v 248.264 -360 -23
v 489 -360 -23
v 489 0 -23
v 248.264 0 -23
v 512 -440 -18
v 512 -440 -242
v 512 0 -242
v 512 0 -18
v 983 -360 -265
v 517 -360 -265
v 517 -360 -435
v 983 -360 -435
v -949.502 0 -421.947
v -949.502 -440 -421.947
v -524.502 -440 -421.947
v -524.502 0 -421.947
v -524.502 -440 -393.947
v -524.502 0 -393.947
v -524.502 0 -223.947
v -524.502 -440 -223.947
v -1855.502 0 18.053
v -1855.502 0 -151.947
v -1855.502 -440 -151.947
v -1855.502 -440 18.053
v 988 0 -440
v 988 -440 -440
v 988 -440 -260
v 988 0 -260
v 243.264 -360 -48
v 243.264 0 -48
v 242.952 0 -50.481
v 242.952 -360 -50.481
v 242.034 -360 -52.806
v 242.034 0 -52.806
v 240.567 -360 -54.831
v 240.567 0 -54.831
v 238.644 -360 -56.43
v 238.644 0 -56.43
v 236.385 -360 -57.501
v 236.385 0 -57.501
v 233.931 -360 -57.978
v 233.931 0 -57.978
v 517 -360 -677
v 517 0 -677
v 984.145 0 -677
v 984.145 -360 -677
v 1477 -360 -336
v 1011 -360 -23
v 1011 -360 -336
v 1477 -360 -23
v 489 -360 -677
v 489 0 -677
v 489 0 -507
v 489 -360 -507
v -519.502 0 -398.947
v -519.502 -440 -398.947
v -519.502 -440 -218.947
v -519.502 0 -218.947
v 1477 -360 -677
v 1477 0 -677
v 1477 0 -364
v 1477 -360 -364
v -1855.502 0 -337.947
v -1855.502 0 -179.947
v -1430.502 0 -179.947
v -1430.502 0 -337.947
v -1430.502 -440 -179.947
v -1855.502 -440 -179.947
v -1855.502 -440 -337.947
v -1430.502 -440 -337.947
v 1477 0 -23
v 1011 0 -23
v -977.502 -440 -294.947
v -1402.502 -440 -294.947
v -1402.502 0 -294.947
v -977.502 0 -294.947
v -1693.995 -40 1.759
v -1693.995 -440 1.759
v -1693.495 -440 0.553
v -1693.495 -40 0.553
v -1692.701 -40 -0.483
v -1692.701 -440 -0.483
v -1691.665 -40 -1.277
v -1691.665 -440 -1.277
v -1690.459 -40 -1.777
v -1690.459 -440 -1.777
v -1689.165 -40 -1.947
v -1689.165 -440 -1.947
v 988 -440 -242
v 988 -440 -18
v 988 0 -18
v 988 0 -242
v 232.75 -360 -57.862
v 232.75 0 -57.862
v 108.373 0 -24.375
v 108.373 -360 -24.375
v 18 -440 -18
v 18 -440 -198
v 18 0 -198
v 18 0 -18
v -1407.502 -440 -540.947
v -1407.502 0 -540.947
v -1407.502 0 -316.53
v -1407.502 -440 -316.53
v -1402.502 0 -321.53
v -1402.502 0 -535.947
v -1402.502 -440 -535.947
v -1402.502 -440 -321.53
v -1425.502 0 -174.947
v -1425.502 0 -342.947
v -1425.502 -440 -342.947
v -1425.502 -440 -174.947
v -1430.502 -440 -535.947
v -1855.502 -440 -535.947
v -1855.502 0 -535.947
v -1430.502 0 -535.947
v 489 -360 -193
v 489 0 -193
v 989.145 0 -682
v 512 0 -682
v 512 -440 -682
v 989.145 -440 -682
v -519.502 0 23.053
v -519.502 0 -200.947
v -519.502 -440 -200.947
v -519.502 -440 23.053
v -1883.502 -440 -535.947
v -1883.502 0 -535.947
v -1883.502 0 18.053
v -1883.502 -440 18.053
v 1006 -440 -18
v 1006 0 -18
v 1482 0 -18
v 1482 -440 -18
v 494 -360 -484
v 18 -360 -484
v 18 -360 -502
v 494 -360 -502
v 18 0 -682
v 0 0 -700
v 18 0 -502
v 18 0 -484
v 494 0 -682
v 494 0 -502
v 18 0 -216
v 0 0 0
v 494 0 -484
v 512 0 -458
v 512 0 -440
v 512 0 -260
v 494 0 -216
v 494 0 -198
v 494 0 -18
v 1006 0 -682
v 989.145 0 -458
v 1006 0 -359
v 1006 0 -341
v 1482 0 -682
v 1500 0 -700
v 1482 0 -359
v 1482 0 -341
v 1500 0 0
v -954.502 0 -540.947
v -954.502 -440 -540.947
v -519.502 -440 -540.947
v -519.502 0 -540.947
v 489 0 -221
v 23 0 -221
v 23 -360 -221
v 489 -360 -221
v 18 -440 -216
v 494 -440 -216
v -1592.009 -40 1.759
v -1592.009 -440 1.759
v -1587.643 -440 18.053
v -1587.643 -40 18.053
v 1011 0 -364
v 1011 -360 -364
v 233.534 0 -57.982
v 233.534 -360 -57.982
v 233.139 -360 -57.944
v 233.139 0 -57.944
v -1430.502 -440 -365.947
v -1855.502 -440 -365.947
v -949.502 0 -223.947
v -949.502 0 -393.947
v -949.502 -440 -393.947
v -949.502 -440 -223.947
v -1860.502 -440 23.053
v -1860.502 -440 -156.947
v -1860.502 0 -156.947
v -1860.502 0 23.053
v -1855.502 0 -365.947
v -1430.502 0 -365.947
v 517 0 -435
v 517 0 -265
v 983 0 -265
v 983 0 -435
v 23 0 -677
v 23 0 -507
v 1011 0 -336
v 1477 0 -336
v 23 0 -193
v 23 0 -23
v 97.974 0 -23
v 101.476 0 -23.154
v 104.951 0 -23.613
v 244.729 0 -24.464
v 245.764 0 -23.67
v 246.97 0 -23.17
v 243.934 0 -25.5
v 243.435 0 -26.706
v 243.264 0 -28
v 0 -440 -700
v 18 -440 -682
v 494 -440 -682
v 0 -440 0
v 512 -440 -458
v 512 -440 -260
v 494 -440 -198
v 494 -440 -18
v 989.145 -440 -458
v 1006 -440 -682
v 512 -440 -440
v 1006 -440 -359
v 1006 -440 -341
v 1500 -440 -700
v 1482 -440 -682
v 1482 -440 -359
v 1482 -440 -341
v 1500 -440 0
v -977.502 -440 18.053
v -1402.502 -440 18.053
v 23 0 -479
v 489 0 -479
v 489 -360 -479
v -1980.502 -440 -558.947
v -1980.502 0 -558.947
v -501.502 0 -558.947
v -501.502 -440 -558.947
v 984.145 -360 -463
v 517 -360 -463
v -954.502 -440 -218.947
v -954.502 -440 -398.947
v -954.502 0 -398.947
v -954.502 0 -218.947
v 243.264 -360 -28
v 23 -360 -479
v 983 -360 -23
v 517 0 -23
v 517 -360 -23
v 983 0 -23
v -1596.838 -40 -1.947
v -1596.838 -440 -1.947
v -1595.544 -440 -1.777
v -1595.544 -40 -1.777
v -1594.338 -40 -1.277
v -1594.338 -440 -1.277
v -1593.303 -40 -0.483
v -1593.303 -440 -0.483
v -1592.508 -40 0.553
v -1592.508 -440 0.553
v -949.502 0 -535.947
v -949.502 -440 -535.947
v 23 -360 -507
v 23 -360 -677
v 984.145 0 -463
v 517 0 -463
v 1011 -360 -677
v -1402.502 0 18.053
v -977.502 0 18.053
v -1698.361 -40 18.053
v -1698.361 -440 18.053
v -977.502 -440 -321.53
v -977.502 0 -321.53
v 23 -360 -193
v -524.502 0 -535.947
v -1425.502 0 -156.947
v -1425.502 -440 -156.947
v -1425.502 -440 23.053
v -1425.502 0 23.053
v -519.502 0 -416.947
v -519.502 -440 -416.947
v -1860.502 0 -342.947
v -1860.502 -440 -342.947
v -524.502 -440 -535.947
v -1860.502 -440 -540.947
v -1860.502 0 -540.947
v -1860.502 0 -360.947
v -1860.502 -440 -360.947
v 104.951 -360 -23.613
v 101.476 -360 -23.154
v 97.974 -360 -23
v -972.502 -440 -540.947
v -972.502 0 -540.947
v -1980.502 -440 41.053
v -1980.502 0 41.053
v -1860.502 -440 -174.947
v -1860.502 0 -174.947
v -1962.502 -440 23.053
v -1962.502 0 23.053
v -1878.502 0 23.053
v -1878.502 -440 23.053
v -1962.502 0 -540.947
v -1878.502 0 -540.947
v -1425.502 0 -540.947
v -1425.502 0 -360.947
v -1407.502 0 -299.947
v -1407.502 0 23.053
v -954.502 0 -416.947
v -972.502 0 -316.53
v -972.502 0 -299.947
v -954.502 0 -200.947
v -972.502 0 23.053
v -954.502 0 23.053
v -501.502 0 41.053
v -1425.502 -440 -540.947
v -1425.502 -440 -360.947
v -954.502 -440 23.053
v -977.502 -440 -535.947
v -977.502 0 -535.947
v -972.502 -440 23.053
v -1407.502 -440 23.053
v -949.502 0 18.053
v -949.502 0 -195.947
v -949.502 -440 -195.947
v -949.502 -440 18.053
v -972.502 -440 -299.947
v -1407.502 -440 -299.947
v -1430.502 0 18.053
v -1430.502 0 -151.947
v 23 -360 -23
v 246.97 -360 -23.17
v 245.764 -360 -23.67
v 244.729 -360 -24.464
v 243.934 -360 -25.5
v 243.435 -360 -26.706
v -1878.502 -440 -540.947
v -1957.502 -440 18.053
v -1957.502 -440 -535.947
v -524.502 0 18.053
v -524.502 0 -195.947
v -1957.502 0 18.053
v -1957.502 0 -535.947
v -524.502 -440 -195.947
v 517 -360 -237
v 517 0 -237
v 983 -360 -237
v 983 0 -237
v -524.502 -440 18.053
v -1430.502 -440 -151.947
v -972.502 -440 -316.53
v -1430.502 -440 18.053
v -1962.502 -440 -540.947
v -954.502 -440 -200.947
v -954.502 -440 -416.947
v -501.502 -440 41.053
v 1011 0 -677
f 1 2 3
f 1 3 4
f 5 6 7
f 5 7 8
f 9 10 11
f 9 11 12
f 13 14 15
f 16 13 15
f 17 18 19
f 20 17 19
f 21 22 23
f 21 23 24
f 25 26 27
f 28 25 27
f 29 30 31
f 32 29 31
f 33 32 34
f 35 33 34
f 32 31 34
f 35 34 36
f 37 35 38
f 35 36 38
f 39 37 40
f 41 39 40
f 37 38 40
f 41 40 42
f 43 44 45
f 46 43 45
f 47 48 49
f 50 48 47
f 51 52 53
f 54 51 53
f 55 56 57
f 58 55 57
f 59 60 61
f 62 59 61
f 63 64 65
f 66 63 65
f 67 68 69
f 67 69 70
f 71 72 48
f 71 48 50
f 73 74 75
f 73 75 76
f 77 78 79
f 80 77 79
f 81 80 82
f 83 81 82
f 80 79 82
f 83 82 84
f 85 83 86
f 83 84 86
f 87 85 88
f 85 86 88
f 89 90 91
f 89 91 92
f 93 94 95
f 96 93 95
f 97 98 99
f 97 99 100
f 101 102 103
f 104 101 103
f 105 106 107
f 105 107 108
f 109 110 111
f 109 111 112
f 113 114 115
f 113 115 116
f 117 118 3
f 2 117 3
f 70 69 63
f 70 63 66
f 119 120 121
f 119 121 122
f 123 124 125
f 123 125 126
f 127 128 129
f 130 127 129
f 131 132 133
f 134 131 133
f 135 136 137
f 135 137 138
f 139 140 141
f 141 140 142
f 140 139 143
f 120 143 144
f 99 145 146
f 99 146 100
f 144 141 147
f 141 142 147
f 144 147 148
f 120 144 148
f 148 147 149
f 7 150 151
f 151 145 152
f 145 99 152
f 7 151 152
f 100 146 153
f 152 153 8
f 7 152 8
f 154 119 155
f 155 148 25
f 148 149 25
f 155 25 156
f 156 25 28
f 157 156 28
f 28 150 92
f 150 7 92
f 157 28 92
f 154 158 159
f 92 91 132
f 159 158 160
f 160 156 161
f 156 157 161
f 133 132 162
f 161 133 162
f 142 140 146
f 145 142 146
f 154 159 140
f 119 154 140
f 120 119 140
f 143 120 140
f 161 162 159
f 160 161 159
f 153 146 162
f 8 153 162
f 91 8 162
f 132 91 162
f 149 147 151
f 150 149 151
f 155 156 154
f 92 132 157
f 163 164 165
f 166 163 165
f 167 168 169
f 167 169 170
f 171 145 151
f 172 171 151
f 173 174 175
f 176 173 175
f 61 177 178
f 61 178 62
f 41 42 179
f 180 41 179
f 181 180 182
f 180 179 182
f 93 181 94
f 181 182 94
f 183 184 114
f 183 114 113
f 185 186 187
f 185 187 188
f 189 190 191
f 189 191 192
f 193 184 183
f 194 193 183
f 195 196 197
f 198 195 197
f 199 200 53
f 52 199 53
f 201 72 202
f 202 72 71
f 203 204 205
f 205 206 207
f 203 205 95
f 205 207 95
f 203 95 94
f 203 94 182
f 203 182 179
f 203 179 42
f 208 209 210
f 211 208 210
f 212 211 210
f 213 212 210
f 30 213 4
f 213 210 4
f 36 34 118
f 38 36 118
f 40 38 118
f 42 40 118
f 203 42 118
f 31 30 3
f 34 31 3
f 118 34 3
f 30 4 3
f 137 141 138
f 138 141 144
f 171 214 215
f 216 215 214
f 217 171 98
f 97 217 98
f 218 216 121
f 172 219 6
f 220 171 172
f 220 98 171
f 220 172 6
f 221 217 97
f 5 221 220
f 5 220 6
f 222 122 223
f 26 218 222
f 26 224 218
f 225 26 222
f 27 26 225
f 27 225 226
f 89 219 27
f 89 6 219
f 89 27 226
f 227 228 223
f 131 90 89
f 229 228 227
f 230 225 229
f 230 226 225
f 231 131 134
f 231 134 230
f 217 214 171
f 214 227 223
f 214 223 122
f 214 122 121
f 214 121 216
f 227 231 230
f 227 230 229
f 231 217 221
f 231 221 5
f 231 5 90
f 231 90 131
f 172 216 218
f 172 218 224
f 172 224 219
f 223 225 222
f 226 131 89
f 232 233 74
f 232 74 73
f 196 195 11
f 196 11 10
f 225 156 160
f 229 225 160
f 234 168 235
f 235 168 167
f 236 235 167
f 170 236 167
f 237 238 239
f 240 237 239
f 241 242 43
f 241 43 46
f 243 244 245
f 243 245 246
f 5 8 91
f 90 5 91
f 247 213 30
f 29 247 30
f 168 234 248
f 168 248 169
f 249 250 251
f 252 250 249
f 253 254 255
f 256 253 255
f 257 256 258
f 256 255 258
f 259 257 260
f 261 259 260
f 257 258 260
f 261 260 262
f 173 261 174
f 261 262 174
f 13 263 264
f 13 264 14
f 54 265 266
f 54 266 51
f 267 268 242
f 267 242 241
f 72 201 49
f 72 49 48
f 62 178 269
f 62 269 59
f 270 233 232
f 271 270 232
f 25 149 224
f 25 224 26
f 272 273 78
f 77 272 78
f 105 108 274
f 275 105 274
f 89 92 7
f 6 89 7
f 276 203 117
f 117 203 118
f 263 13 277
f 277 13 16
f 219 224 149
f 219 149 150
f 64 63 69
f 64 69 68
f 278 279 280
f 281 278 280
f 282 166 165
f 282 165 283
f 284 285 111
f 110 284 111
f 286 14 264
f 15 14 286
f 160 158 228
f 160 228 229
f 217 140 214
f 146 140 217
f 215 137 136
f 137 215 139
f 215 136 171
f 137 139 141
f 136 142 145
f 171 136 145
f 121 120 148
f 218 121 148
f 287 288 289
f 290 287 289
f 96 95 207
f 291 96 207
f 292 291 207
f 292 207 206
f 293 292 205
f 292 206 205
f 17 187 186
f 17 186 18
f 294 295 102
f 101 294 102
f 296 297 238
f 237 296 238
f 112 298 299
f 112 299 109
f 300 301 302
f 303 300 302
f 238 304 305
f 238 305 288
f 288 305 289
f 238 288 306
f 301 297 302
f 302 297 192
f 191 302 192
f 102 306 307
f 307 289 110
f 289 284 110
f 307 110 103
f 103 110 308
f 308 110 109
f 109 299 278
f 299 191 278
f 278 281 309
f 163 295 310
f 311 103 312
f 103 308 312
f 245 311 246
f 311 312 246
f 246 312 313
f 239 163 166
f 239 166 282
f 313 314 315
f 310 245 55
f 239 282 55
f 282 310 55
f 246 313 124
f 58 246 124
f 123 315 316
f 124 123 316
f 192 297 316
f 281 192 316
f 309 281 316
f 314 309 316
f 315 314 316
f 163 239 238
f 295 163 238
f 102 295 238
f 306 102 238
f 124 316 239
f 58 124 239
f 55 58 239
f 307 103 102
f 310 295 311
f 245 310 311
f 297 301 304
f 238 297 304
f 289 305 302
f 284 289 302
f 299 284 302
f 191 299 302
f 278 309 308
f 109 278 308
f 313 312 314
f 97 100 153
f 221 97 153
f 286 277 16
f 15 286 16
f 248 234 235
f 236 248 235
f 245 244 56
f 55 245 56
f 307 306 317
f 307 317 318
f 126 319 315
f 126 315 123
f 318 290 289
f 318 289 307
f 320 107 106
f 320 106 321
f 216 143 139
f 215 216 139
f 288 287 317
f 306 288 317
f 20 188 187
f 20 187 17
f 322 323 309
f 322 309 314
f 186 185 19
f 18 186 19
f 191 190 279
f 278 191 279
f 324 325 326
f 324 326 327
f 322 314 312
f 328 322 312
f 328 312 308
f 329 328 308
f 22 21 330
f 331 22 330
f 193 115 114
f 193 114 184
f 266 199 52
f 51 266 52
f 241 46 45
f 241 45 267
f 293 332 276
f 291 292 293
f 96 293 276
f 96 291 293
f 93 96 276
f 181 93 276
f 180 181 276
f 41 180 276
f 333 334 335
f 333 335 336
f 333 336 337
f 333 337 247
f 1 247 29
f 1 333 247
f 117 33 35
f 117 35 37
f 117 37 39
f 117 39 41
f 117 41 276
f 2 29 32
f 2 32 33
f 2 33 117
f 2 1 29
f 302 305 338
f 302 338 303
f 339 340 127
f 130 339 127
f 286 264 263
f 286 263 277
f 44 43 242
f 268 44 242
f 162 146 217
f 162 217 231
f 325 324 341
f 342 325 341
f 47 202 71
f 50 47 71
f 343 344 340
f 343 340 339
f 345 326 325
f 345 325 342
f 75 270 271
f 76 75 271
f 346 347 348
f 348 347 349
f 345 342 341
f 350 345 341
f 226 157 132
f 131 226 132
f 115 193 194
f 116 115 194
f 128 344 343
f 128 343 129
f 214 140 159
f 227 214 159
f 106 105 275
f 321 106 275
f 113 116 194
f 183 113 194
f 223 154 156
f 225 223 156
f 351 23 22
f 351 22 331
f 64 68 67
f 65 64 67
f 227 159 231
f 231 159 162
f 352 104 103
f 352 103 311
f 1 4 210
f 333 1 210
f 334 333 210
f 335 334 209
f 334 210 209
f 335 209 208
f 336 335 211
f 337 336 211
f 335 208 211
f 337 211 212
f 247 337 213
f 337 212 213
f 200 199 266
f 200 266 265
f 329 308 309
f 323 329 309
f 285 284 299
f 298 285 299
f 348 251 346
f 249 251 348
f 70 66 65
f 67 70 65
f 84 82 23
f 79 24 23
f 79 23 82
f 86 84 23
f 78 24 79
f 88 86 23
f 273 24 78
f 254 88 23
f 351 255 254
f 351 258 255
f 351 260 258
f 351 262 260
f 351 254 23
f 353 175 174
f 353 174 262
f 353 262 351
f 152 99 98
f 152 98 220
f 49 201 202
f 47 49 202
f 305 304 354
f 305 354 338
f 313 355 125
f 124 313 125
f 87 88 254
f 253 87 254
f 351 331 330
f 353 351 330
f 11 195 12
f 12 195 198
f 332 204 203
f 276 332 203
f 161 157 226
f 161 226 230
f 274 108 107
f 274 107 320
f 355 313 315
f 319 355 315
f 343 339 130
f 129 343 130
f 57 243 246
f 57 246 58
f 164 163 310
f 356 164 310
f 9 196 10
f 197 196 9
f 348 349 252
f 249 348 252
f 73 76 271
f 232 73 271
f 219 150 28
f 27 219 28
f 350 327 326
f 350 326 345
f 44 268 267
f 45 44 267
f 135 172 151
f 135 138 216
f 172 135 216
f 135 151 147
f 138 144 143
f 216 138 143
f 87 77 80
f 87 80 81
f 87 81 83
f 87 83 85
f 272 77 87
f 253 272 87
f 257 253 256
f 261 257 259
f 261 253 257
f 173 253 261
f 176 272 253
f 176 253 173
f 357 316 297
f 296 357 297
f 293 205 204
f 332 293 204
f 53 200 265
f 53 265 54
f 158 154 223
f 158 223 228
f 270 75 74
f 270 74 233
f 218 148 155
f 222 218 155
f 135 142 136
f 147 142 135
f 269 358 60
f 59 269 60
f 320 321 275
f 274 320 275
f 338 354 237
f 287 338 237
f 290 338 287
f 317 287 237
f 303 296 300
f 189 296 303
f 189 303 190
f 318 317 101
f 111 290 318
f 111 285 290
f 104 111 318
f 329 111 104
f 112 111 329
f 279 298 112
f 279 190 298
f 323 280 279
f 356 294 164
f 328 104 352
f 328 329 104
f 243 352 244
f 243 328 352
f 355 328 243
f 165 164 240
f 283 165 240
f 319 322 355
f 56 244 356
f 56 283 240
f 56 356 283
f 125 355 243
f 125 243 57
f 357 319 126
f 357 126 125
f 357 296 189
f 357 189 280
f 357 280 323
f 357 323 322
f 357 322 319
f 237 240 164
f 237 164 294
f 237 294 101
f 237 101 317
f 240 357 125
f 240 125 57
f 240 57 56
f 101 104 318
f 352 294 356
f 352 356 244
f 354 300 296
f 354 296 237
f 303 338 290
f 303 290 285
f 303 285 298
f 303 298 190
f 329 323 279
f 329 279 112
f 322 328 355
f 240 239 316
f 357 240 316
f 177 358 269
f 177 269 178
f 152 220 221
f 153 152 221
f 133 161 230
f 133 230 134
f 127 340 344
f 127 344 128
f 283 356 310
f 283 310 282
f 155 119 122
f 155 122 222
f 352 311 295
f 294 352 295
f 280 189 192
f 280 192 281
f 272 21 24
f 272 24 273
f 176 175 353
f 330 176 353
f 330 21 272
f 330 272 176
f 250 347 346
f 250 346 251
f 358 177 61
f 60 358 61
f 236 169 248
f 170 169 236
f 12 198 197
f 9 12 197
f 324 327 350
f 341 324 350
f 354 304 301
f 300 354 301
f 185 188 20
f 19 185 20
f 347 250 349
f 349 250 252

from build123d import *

# Parameters (mm, degrees)
F0_W     = 1500
F0_H     = 700
F0_W_2   = 477.1447038651
F0_H_2   = 224
F0_W_3   = 476
F0_H_3   = 323
F0_H_4   = 180
F0_H_5   = 18
F1_DEPTH = 360
F2_DEPTH = 360
F0_W_4   = 466
F0_H_6   = 214
F0_H_7   = 313
F0_H_8   = 258
F0_H_9   = 170
F0_W_5   = 467.1447038651
F3_DEPTH = 440
F0_W_6   = 435
F0_H_10  = 124
F0_W_7   = 84
F0_H_11  = 564
F0_H_12  = 168
F0_W_8   = 425
F4_DEPTH = 440
F0_H_13  = 114
F0_H_14  = 214.4168760482
F0_W_9   = 424.9999999106
F0_H_15  = 169.9999999106
F0_H_16  = 158
F0_W_10  = 74
F0_H_17  = 554
F6_DEPTH = 400


with BuildPart() as f1:
    # F0 (on Front) → F1 (new body)
    with BuildSketch(Plane.XZ):
        with Locations((750, -350)):
            Rectangle(F0_W, F0_H)
        with Locations((750.5723519325, -570)):
            Rectangle(F0_W_2, F0_H_2, mode=Mode.SUBTRACT)
        with Locations((1244, -520.5)):
            Rectangle(F0_W_3, F0_H_3, mode=Mode.SUBTRACT)
        Polygon((494, -682), (18, -682), (18, -502), (18, -484), (18, -216), (494, -216), (494, -484), (494, -502), align=None, mode=Mode.SUBTRACT)
        with Locations((750, -350)):
            Rectangle(F0_W_3, F0_H_4, mode=Mode.SUBTRACT)
        with Locations((1244, -179.5)):
            Rectangle(F0_W_3, F0_H_3, mode=Mode.SUBTRACT)
        with Locations((256, -108)):
            Rectangle(F0_W_3, F0_H_4, mode=Mode.SUBTRACT)
        Polygon((512, -178), (512, -18), (988, -18), (988, -206), (988, -242), (512, -242), align=None, mode=Mode.SUBTRACT)
        with Locations((256, -493)):
            Rectangle(F0_W_3, F0_H_5)
    extrude(amount=F1_DEPTH)

    # F0 (on Front) → F3 (join)
    with BuildSketch(Plane.XZ):
        with Locations((750, -350)):
            Rectangle(F0_W, F0_H)
        with Locations((750.5723519325, -570)):
            Rectangle(F0_W_2, F0_H_2, mode=Mode.SUBTRACT)
        with Locations((1244, -520.5)):
            Rectangle(F0_W_3, F0_H_3, mode=Mode.SUBTRACT)
        Polygon((494, -682), (18, -682), (18, -502), (18, -484), (18, -216), (494, -216), (494, -484), (494, -502), align=None, mode=Mode.SUBTRACT)
        with Locations((750, -350)):
            Rectangle(F0_W_3, F0_H_4, mode=Mode.SUBTRACT)
        with Locations((1244, -179.5)):
            Rectangle(F0_W_3, F0_H_3, mode=Mode.SUBTRACT)
        with Locations((256, -108)):
            Rectangle(F0_W_3, F0_H_4, mode=Mode.SUBTRACT)
        Polygon((512, -178), (512, -18), (988, -18), (988, -206), (988, -242), (512, -242), align=None, mode=Mode.SUBTRACT)
    extrude(amount=F3_DEPTH)


with BuildPart() as f2:
    # F0 (on Front) → F2 (new body)
    with BuildSketch(Plane.XZ):
        with BuildLine():
            Line((97.9740232229, -23.0000000447), (23.0000000447, -23.0000000447))
            Line((23.0000000447, -23.0000000447), (23.0000000447, -192.9999999553))
            Line((23.0000000447, -192.9999999553), (488.9999999553, -192.9999999553))
            Line((488.9999999553, -192.9999999553), (488.9999999553, -23.0000000447))
            Line((488.9999999553, -23.0000000447), (258.2644462839, -23.0000000447))
            Line((258.2644462839, -23.0000000447), (248.2644462839, -23.0000000447))
            ThreePointArc((248.2644462839, -23.0000000447), (244.728912378, -24.4644661388), (243.2644462839, -28.0000000447))
            Line((243.2644462839, -28.0000000447), (243.2644462839, -48.0000000447))
            ThreePointArc((243.2644462839, -48.0000000447), (240.5672293819, -54.8314976129), (233.9305744791, -57.9777890396))
            ThreePointArc((233.9305744791, -57.9777890396), (233.3355664083, -57.9684156693), (232.7501607809, -57.8615385631))
            Line((232.7501607809, -57.8615385631), (108.3729621608, -24.3753697039))
            ThreePointArc((108.3729621608, -24.3753697039), (103.2187723288, -23.3453331464), (97.9740232229, -23.0000000447))
        make_face()
    extrude(amount=F2_DEPTH)


with BuildPart() as f2b:
    # F0 (on Front) → F2, piece 2 (new body)
    with BuildSketch(Plane.XZ):
        with Locations((750, -130)):
            Rectangle(F0_W_4, F0_H_6)
    extrude(amount=F2_DEPTH)


with BuildPart() as f2c:
    # F0 (on Front) → F2, piece 3 (new body)
    with BuildSketch(Plane.XZ):
        with Locations((1244, -179.5)):
            Rectangle(F0_W_4, F0_H_7)
    extrude(amount=F2_DEPTH)


with BuildPart() as f2d:
    # F0 (on Front) → F2, piece 4 (new body)
    with BuildSketch(Plane.XZ):
        with Locations((256, -350)):
            Rectangle(F0_W_4, F0_H_8)
    extrude(amount=F2_DEPTH)


with BuildPart() as f2e:
    # F0 (on Front) → F2, piece 5 (new body)
    with BuildSketch(Plane.XZ):
        with Locations((256, -592)):
            Rectangle(F0_W_4, F0_H_9)
    extrude(amount=F2_DEPTH)


with BuildPart() as f2f:
    # F0 (on Front) → F2, piece 6 (new body)
    with BuildSketch(Plane.XZ):
        with Locations((1244, -520.5)):
            Rectangle(F0_W_4, F0_H_7)
    extrude(amount=F2_DEPTH)


with BuildPart() as f2g:
    # F0 (on Front) → F2, piece 7 (new body)
    with BuildSketch(Plane.XZ):
        with Locations((750, -350)):
            Rectangle(F0_W_4, F0_H_9)
    extrude(amount=F2_DEPTH)


with BuildPart() as f2h:
    # F0 (on Front) → F2, piece 8 (new body)
    with BuildSketch(Plane.XZ):
        with Locations((750.5723519325, -570)):
            Rectangle(F0_W_5, F0_H_6)
    extrude(amount=F2_DEPTH)


with BuildPart() as f3:
    # F0 (on Front) → F3, piece 2 (new body)
    with BuildSketch(Plane.XZ):
        Polygon((-501.5018062246, 41.052677546), (-1980.5018062246, 41.052677546), (-1980.5018062246, 23.052677546), (-1980.5018062246, -558.947322454), (-501.5018062246, -558.947322454), (-501.5018062246, 23.052677546), align=None)
        with Locations((-1643.0018062246, -450.947322454)):
            Rectangle(F0_W_6, F0_H_4, mode=Mode.SUBTRACT)
        Polygon((-1407.5018062246, -316.5304464058), (-972.5018062246, -316.5304464058), (-972.5018062246, -540.947322454), (-1407.5018062246, -540.947322454), (-1407.5018062246, -515.947322454), align=None, mode=Mode.SUBTRACT)
        with Locations((-737.0018062246, -478.947322454)):
            Rectangle(F0_W_6, F0_H_10, mode=Mode.SUBTRACT)
        with Locations((-1920.5018062246, -258.947322454)):
            Rectangle(F0_W_7, F0_H_11, mode=Mode.SUBTRACT)
        with Locations((-1643.0018062246, -258.947322454)):
            Rectangle(F0_W_6, F0_H_12, mode=Mode.SUBTRACT)
        with Locations((-737.0018062246, -308.947322454)):
            Rectangle(F0_W_6, F0_H_4, mode=Mode.SUBTRACT)
        with Locations((-1643.0018062246, -66.947322454)):
            Rectangle(F0_W_6, F0_H_4, mode=Mode.SUBTRACT)
        Polygon((-1407.5018062246, -36.947322454), (-1407.5018062246, 23.052677546), (-972.5018062246, 23.052677546), (-972.5018062246, -64.947322454), (-972.5018062246, -299.947322454), (-1407.5018062246, -299.947322454), align=None, mode=Mode.SUBTRACT)
        with Locations((-737.0018062246, -88.947322454)):
            Rectangle(F0_W_6, F0_H_2, mode=Mode.SUBTRACT)
    extrude(amount=F3_DEPTH)


with BuildPart() as f4:
    # F0 (on Front) → F4 (new body)
    with BuildSketch(Plane.XZ):
        with Locations((-737.0018062246, -88.947322454)):
            Rectangle(F0_W_8, F0_H_6)
    extrude(amount=F4_DEPTH)


with BuildPart() as f4b:
    # F0 (on Front) → F4, piece 2 (new body)
    with BuildSketch(Plane.XZ):
        with Locations((-737.0018062246, -308.947322454)):
            Rectangle(F0_W_8, F0_H_9)
    extrude(amount=F4_DEPTH)


with BuildPart() as f4c:
    # F0 (on Front) → F4, piece 3 (new body)
    with BuildSketch(Plane.XZ):
        with Locations((-737.0018062246, -478.947322454)):
            Rectangle(F0_W_8, F0_H_13)
    extrude(amount=F4_DEPTH)


with BuildPart() as f4d:
    # F0 (on Front) → F4, piece 4 (new body)
    with BuildSketch(Plane.XZ):
        with Locations((-1190.0018062246, -138.447322454)):
            Rectangle(F0_W_8, F0_H_7)
    extrude(amount=F4_DEPTH)


with BuildPart() as f4e:
    # F0 (on Front) → F4, piece 5 (new body)
    with BuildSketch(Plane.XZ):
        with Locations((-1190.0018062246, -428.7388844299)):
            Rectangle(F0_W_8, F0_H_14)
    extrude(amount=F4_DEPTH)


with BuildPart() as f4f:
    # F0 (on Front) → F4, piece 6 (new body)
    with BuildSketch(Plane.XZ):
        with Locations((-1643.0018062246, -66.947322454)):
            Rectangle(F0_W_9, F0_H_15)
    extrude(amount=F4_DEPTH)

    # F5 (on face) → F6 (cut)
    with BuildSketch(Plane.XZ.offset(440)):
        with BuildLine():
            Line((-1689.1651712847, -1.9473224987), (-1643.0018062246, -1.9473224987))
            Line((-1643.0018062246, -1.9473224987), (-1596.8384411645, -1.9473224987))
            ThreePointArc((-1596.8384411645, -1.9473224987), (-1593.7946340194, -0.9140892002), (-1592.008812033, 1.7585822758))
            Line((-1592.008812033, 1.7585822758), (-1587.6428223759, 18.0526775013))
            Line((-1587.6428223759, 18.0526775013), (-1698.3607900732, 18.0526775013))
            Line((-1698.3607900732, 18.0526775013), (-1693.9948004161, 1.7585822758))
            ThreePointArc((-1693.9948004161, 1.7585822758), (-1692.2089784297, -0.9140892002), (-1689.1651712847, -1.9473224987))
        make_face()
    extrude(amount=-F6_DEPTH, mode=Mode.SUBTRACT)


with BuildPart() as f4g:
    # F0 (on Front) → F4, piece 7 (new body)
    with BuildSketch(Plane.XZ):
        with Locations((-1643.0018062246, -258.947322454)):
            Rectangle(F0_W_8, F0_H_16)
    extrude(amount=F4_DEPTH)


with BuildPart() as f4h:
    # F0 (on Front) → F4, piece 8 (new body)
    with BuildSketch(Plane.XZ):
        with Locations((-1643.0018062246, -450.947322454)):
            Rectangle(F0_W_8, F0_H_9)
    extrude(amount=F4_DEPTH)


with BuildPart() as f4i:
    # F0 (on Front) → F4, piece 9 (new body)
    with BuildSketch(Plane.XZ):
        with Locations((-1920.5018062246, -258.947322454)):
            Rectangle(F0_W_10, F0_H_17)
    extrude(amount=F4_DEPTH)


solid = Compound([f1.part, f2.part, f2b.part, f2c.part, f2d.part, f2e.part, f2f.part, f2g.part, f2h.part, f3.part, f4.part, f4b.part, f4c.part, f4d.part, f4e.part, f4f.part, f4g.part, f4h.part, f4i.part])
